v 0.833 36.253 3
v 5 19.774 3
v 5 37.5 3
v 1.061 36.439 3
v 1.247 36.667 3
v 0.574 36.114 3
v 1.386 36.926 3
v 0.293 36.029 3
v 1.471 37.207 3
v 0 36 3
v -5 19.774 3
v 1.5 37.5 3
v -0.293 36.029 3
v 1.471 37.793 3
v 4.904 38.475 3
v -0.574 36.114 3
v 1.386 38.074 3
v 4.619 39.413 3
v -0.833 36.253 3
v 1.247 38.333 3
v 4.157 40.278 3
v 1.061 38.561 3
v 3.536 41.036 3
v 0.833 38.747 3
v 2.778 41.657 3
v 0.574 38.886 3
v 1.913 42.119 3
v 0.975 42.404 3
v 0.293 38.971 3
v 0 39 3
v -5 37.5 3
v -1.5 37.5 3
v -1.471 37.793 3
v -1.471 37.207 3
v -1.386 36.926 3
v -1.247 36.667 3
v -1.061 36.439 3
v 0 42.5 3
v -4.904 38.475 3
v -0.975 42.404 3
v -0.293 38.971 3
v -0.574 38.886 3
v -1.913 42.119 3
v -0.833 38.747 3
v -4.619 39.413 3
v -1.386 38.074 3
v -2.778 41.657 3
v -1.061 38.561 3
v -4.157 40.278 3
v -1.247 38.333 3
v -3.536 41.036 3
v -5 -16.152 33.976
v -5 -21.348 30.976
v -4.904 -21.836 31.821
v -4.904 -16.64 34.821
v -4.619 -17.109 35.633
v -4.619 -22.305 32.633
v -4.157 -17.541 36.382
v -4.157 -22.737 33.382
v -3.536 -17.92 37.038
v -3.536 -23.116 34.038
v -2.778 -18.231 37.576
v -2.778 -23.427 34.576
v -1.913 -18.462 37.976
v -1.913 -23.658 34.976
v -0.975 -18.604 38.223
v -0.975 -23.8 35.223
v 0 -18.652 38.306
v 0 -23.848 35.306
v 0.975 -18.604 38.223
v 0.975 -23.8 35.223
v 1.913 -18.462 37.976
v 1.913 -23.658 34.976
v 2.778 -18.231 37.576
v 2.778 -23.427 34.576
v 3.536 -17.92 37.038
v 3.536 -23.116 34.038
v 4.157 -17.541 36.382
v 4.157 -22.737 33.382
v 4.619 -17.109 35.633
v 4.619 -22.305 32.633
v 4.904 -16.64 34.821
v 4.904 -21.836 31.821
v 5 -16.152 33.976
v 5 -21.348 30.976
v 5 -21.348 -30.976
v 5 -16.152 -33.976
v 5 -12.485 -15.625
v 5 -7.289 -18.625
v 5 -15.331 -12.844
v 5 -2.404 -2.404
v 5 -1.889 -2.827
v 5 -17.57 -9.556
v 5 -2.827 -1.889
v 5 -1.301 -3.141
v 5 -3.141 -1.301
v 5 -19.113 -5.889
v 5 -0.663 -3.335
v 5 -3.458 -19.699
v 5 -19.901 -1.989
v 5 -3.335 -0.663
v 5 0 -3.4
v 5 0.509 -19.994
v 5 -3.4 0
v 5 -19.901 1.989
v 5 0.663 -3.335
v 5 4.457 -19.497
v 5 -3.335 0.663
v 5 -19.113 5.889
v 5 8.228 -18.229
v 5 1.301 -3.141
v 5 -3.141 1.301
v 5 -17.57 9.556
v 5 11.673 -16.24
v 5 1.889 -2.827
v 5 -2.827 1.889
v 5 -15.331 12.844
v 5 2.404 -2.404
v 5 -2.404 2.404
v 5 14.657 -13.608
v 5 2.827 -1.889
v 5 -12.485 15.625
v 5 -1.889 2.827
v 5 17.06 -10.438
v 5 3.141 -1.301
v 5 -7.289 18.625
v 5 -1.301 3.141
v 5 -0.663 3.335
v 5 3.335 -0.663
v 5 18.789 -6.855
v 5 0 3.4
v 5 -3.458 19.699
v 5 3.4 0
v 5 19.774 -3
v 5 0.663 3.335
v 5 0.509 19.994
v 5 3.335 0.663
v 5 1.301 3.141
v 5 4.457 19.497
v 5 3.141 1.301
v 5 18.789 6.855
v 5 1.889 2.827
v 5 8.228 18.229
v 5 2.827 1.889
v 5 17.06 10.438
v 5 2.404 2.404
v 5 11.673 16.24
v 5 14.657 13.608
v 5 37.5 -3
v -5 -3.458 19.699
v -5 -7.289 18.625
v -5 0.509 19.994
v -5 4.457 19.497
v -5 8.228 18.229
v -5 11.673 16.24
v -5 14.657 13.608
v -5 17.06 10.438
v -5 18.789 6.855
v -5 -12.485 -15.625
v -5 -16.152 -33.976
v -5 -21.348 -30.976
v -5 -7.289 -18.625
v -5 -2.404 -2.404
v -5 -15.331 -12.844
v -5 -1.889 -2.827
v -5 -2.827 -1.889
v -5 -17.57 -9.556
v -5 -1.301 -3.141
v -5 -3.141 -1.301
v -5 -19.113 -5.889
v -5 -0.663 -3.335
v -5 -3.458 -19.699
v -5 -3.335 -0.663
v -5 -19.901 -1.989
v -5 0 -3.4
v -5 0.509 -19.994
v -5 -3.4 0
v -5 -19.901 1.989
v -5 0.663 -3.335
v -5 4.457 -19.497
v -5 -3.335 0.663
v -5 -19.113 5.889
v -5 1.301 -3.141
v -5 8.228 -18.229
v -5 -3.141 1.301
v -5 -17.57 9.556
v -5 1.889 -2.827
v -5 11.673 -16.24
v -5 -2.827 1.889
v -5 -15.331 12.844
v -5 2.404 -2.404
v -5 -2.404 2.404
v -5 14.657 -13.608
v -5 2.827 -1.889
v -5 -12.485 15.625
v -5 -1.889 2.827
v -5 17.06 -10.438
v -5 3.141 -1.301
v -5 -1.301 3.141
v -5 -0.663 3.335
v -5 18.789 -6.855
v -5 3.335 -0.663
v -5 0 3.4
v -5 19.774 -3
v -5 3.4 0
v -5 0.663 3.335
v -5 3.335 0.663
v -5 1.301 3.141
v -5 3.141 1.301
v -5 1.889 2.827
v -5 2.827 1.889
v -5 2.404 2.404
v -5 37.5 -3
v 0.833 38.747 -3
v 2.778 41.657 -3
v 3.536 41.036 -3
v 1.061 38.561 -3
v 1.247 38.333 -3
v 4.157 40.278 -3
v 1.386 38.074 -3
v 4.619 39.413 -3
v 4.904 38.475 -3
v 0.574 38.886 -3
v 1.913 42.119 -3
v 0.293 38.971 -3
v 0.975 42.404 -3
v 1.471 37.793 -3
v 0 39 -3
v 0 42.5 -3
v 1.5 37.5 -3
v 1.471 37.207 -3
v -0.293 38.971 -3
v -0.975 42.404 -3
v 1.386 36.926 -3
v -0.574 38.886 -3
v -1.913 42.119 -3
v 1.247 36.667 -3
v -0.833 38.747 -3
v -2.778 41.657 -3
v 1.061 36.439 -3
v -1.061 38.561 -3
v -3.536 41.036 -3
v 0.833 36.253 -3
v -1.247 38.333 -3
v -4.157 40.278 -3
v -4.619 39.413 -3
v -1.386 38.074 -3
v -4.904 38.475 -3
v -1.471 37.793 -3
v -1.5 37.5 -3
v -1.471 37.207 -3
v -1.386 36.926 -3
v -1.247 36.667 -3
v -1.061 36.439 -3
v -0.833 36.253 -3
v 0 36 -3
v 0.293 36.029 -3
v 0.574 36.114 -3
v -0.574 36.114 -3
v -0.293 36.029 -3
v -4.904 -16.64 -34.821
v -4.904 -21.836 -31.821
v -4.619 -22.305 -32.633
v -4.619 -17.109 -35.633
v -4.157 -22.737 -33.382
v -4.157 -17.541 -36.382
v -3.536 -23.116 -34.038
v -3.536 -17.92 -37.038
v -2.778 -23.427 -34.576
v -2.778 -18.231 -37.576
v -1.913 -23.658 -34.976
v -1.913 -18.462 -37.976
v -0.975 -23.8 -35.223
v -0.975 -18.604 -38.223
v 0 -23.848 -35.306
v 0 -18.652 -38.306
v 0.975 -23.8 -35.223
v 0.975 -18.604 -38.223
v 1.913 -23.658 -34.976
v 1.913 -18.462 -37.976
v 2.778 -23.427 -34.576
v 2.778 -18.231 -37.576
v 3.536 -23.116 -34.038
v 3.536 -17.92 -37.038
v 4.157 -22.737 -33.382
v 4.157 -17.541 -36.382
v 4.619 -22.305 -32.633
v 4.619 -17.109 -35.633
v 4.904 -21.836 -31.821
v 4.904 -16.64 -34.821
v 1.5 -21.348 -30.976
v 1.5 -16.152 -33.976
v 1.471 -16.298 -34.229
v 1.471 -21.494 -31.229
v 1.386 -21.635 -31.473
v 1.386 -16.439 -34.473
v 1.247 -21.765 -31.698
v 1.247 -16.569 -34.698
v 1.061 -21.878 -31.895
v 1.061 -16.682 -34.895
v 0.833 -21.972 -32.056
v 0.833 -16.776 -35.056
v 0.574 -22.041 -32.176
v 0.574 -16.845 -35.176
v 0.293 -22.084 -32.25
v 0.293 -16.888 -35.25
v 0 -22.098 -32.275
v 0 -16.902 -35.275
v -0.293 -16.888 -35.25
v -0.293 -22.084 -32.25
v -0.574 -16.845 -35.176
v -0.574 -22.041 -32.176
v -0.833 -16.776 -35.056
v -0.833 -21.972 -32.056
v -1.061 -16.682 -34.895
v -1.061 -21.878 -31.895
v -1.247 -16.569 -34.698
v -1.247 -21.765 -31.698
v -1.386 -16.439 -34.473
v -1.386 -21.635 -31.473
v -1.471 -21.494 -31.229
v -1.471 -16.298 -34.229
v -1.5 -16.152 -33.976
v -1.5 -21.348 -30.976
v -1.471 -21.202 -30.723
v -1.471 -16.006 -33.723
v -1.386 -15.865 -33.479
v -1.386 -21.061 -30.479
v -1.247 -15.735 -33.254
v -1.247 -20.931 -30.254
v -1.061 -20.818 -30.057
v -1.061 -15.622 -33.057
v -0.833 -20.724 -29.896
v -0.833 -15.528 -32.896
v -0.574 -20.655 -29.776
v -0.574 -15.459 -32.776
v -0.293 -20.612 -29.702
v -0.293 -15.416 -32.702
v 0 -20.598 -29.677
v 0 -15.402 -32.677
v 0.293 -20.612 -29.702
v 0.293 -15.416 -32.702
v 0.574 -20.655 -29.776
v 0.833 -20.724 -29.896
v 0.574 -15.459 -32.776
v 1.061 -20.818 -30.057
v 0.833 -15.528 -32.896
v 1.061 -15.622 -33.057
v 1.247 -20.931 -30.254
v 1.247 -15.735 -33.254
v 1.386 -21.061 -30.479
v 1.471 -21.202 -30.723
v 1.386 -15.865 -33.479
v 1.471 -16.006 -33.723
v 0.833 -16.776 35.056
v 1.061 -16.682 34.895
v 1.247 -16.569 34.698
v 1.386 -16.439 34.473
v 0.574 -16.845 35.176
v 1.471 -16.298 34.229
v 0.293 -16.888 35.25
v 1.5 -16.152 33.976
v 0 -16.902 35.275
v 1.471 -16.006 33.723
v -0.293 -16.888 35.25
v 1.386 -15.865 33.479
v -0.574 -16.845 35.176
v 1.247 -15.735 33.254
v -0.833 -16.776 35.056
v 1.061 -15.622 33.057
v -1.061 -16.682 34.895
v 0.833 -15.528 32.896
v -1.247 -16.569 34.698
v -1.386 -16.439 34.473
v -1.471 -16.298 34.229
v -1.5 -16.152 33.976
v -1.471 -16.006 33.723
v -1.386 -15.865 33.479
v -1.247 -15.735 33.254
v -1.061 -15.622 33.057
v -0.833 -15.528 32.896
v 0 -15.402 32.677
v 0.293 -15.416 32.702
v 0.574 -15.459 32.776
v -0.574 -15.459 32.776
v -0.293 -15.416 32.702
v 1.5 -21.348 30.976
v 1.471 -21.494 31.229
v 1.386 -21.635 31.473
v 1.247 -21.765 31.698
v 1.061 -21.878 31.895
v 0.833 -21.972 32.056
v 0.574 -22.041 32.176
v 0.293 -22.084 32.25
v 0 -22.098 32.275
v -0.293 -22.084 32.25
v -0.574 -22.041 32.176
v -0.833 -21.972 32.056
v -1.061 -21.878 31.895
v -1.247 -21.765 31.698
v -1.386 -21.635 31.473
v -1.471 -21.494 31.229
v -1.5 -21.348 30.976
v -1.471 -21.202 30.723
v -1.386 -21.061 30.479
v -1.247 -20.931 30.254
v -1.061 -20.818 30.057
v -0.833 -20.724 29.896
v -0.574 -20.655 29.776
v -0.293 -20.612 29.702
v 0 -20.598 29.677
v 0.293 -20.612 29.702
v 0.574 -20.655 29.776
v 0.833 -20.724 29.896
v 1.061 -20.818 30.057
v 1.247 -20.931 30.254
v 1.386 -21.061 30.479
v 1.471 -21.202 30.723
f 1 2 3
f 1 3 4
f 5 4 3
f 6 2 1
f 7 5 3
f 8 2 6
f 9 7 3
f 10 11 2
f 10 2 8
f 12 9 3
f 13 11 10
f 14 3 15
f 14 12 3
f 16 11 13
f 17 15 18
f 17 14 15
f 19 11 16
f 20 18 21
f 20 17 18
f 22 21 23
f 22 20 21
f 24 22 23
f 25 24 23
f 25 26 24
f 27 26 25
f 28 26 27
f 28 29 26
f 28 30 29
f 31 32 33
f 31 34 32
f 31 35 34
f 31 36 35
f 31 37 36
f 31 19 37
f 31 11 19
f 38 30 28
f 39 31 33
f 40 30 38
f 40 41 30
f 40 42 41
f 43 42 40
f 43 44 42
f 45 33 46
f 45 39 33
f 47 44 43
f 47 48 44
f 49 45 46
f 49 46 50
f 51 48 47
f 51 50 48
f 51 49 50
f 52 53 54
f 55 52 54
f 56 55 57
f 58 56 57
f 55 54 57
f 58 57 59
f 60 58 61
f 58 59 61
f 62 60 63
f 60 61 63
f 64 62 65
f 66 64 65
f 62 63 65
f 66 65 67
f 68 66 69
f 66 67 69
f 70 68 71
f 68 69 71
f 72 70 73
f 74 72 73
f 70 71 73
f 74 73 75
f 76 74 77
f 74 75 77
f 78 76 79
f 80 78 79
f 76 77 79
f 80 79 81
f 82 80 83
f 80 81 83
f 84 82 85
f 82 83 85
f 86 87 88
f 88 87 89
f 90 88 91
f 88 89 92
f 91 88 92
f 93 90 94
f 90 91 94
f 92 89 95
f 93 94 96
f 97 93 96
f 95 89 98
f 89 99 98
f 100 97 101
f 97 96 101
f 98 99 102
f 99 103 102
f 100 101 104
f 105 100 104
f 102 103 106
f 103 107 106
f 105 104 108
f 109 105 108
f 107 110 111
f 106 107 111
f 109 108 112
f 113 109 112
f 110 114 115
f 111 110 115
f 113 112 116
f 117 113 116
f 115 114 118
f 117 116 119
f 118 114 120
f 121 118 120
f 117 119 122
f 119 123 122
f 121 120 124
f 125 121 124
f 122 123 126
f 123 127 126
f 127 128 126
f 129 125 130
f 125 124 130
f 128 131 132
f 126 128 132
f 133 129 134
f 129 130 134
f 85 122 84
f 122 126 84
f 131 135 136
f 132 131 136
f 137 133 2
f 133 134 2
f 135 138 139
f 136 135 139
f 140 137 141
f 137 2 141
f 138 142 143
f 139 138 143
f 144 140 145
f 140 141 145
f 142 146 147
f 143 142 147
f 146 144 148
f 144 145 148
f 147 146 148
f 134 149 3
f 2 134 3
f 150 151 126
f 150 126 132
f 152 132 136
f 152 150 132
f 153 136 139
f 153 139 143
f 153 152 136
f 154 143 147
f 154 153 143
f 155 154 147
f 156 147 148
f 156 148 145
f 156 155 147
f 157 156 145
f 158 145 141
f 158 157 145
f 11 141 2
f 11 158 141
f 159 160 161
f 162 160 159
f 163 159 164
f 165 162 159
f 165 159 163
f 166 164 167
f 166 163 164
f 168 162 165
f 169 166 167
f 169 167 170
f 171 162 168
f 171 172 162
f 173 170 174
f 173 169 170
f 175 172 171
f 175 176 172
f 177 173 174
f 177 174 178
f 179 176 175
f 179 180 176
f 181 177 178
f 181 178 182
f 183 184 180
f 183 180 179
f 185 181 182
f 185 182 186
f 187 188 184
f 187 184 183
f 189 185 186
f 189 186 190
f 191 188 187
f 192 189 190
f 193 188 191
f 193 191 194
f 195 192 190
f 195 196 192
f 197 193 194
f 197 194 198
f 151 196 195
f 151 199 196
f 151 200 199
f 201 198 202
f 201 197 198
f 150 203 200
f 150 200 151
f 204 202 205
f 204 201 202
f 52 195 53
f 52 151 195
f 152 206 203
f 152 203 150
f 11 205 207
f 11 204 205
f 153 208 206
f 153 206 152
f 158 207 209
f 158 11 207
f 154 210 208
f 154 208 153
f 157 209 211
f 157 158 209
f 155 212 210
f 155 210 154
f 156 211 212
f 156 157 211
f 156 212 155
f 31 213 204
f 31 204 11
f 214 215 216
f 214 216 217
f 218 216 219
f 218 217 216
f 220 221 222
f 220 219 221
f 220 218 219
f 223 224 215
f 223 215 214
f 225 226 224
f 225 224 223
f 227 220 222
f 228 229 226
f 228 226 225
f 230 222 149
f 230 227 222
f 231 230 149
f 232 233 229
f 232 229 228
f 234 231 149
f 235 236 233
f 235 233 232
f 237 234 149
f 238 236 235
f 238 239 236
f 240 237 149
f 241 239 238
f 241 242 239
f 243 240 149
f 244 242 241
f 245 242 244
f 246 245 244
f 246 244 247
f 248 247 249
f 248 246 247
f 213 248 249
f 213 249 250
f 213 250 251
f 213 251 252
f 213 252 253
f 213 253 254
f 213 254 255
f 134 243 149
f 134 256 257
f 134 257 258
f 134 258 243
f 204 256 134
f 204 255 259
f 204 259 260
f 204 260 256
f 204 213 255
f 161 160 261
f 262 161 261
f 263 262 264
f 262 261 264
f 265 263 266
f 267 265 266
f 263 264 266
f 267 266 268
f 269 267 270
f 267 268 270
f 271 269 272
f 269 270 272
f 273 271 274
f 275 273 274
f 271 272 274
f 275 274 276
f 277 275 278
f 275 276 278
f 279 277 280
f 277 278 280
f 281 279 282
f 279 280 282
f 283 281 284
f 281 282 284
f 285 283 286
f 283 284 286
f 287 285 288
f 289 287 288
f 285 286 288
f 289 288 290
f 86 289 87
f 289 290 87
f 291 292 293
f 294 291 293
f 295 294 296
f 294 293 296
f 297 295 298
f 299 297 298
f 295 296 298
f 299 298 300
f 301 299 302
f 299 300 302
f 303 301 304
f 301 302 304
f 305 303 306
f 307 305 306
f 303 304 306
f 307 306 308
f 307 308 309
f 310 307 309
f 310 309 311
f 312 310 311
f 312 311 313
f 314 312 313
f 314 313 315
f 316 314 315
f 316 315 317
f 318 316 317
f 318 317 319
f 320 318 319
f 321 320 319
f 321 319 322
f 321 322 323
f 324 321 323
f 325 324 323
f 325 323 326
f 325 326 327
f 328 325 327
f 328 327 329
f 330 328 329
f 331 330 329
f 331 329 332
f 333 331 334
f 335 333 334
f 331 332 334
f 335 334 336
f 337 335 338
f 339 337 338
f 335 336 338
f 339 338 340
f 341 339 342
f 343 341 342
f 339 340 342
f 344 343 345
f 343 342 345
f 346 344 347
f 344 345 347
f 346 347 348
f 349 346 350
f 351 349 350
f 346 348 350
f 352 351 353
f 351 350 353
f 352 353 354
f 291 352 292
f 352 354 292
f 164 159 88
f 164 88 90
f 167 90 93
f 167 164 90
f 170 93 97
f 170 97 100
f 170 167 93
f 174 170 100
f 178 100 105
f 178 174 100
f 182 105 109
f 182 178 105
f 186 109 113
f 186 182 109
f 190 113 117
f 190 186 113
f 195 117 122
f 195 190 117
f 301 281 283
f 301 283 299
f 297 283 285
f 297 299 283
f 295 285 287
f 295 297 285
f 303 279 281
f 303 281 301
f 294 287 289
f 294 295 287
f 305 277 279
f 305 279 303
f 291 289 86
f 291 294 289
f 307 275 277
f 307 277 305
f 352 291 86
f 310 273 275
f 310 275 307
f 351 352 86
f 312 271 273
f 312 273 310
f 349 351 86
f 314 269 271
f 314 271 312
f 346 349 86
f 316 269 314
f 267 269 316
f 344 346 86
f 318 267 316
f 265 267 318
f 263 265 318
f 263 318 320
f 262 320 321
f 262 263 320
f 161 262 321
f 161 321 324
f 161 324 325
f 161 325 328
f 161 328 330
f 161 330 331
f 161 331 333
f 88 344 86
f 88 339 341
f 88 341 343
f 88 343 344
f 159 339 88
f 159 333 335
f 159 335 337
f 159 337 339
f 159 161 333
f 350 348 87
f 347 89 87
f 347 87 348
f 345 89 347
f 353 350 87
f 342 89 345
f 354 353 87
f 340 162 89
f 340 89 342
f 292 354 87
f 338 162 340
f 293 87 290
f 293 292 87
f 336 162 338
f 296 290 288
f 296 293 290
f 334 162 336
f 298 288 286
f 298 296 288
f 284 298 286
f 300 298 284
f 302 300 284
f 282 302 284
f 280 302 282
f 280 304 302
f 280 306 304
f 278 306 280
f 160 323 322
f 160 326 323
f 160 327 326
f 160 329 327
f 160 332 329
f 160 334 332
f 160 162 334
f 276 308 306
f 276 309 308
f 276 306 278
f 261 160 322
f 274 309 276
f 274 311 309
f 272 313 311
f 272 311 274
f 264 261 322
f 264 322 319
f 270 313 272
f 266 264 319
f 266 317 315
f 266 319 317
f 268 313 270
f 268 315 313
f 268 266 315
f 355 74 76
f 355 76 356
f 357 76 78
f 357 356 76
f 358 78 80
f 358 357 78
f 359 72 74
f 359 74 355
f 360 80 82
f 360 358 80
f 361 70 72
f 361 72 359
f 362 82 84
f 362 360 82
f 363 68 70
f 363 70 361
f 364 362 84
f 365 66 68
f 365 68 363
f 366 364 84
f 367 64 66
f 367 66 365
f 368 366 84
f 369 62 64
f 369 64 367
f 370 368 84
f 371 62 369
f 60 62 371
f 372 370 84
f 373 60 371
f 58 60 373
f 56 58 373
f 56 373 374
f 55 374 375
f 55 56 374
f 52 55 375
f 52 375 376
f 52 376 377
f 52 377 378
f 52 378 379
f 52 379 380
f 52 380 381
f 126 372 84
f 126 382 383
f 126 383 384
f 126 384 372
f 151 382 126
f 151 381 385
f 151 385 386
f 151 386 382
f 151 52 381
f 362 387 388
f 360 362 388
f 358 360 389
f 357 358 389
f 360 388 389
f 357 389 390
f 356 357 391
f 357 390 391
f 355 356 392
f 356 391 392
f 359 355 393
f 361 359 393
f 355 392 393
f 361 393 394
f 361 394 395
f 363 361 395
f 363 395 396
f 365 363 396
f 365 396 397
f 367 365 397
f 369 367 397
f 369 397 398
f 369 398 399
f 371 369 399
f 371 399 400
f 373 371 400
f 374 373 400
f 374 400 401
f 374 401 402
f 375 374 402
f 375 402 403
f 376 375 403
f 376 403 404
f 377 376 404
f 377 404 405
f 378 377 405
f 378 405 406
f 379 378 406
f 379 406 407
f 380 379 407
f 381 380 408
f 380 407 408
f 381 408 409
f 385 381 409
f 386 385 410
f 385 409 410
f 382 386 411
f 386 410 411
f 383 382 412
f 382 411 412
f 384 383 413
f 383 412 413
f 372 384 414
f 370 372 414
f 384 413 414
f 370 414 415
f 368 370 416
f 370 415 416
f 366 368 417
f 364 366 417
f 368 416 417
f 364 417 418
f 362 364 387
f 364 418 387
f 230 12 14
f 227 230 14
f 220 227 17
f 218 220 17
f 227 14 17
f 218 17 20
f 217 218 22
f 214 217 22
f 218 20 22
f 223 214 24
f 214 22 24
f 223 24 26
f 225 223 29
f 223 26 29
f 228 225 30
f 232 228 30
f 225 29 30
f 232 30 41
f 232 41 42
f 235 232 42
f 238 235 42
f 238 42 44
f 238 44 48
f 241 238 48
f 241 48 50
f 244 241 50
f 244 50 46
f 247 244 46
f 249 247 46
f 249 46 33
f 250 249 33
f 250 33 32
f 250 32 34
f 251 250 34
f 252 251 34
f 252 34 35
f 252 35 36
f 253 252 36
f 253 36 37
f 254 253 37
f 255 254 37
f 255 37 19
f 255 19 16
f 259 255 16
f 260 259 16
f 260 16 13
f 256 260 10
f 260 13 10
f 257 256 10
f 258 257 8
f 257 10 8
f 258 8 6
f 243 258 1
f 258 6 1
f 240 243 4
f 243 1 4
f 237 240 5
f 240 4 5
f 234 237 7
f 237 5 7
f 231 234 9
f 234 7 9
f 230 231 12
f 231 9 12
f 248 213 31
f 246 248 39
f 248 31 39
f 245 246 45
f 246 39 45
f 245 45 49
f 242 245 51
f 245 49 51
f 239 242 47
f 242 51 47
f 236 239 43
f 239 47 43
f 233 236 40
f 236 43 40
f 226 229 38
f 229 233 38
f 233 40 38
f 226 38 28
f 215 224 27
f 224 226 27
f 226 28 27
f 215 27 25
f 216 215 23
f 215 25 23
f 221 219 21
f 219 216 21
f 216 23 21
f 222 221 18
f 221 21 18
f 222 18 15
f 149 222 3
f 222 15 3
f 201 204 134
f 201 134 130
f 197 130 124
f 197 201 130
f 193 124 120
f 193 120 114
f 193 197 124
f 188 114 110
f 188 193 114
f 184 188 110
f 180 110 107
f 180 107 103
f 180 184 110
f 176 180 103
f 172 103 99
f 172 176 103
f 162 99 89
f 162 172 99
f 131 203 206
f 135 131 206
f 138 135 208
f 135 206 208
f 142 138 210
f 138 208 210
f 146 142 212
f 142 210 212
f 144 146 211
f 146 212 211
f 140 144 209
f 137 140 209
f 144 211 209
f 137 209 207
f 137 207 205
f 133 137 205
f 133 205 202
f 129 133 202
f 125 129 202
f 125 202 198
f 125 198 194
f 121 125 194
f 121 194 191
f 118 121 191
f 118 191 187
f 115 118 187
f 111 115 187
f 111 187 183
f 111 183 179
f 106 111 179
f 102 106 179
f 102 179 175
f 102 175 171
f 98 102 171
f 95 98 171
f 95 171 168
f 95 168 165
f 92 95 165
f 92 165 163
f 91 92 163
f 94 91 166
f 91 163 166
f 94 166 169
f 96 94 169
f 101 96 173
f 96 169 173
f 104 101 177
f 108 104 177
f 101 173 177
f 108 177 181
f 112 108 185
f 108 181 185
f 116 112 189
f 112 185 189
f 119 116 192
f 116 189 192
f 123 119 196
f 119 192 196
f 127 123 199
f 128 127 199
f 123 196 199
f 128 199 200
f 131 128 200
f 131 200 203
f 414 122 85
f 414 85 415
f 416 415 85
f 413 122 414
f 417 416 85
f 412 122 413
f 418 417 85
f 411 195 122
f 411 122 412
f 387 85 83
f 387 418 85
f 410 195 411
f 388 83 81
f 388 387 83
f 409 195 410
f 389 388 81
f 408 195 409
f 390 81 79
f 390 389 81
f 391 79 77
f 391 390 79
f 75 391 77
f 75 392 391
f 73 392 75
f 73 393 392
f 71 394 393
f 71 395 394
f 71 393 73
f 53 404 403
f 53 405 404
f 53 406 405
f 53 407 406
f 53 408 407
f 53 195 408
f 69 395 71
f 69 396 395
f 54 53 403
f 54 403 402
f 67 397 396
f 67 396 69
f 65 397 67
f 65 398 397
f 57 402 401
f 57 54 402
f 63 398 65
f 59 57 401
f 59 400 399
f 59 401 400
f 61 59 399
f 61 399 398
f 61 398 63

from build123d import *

# Parameters (mm, degrees)
BOSS_EXTRU_1_DEPTH           = 5
BOSS_EXTRU_1_DEPTH_BACK      = 5
TROU_TARAUD_M81_D            = 6.8
ESQUISSE5_R                  = 1.5
ENL_V_MAT_EXTRU_1_DEPTH      = 60.476400504
R_P_TITION_CIRCULAIRE1_COUNT = 3


with BuildPart() as part:
    # Esquisse1 → Boss.-Extru.1 (new, two sides: drawn at the far end of the back side and taken through both)
    with BuildSketch(Plane(origin=(0, 0, 0), x_dir=(0, 0, -1), z_dir=(1, 0, 0)).offset(-BOSS_EXTRU_1_DEPTH_BACK)):
        with BuildLine():
            Line((-3, 42.5), (3, 42.5))
            Line((3, 42.5), (3, 19.773719933))
            ThreePointArc((3, 19.773719933), (17.320508076, 10), (18.62454379, -7.288783755))
            Line((18.62454379, -7.288783755), (38.306079661, -18.651923789))
            Line((38.306079661, -18.651923789), (35.306079661, -23.848076211))
            Line((35.306079661, -23.848076211), (15.62454379, -12.484936178))
            ThreePointArc((15.62454379, -12.484936178), (0, -20), (-15.62454379, -12.484936178))
            Line((-15.62454379, -12.484936178), (-35.306079661, -23.848076211))
            Line((-35.306079661, -23.848076211), (-38.306079661, -18.651923789))
            Line((-38.306079661, -18.651923789), (-18.62454379, -7.288783755))
            ThreePointArc((-18.62454379, -7.288783755), (-17.320508076, 10), (-3, 19.773719933))
            Line((-3, 19.773719933), (-3, 42.5))
        make_face()
    extrude(amount=BOSS_EXTRU_1_DEPTH + BOSS_EXTRU_1_DEPTH_BACK)

    # Trou taraudé M81 (through all)
    with Locations(Plane(origin=(5, 0, 0), x_dir=(0, 0, -1), z_dir=(1, 0, 0))):
        with Locations((0, 0)):
            Hole(TROU_TARAUD_M81_D / 2)

    # Esquisse5 → Enlèv. mat.-Extru.1 (cut, through all)
    with BuildSketch(Plane.XY.offset(3)):
        with Locations((0, 37.5)):
            Circle(ESQUISSE5_R)
        with BuildLine():
            Line((-5, 19.773719933), (-5, 37.5))
            ThreePointArc((-5, 37.5), (0, 42.5), (5, 37.5))
            Line((5, 37.5), (5, 19.773719933))
            Line((5, 19.773719933), (13.62028311, 19.773719933))
            Line((13.62028311, 19.773719933), (13.62028311, 47.5))
            Line((13.62028311, 47.5), (-13.199246966, 47.5))
            Line((-13.199246966, 47.5), (-13.199246966, 19.773719933))
            Line((-13.199246966, 19.773719933), (-5, 19.773719933))
        make_face()
    enl_v_mat_extru_1 = extrude(amount=-ENL_V_MAT_EXTRU_1_DEPTH, mode=Mode.SUBTRACT)

    # Répétition circulaire1: Enlèv. mat.-Extru.1 ×3 about axis
    r_p_tition_circulaire1_axis = Axis((5, 0, 0), (1, 0, 0))
    for i in range(1, R_P_TITION_CIRCULAIRE1_COUNT):
        add(enl_v_mat_extru_1.rotate(r_p_tition_circulaire1_axis, i * 360 / R_P_TITION_CIRCULAIRE1_COUNT), mode=Mode.SUBTRACT)


solid = part.part
